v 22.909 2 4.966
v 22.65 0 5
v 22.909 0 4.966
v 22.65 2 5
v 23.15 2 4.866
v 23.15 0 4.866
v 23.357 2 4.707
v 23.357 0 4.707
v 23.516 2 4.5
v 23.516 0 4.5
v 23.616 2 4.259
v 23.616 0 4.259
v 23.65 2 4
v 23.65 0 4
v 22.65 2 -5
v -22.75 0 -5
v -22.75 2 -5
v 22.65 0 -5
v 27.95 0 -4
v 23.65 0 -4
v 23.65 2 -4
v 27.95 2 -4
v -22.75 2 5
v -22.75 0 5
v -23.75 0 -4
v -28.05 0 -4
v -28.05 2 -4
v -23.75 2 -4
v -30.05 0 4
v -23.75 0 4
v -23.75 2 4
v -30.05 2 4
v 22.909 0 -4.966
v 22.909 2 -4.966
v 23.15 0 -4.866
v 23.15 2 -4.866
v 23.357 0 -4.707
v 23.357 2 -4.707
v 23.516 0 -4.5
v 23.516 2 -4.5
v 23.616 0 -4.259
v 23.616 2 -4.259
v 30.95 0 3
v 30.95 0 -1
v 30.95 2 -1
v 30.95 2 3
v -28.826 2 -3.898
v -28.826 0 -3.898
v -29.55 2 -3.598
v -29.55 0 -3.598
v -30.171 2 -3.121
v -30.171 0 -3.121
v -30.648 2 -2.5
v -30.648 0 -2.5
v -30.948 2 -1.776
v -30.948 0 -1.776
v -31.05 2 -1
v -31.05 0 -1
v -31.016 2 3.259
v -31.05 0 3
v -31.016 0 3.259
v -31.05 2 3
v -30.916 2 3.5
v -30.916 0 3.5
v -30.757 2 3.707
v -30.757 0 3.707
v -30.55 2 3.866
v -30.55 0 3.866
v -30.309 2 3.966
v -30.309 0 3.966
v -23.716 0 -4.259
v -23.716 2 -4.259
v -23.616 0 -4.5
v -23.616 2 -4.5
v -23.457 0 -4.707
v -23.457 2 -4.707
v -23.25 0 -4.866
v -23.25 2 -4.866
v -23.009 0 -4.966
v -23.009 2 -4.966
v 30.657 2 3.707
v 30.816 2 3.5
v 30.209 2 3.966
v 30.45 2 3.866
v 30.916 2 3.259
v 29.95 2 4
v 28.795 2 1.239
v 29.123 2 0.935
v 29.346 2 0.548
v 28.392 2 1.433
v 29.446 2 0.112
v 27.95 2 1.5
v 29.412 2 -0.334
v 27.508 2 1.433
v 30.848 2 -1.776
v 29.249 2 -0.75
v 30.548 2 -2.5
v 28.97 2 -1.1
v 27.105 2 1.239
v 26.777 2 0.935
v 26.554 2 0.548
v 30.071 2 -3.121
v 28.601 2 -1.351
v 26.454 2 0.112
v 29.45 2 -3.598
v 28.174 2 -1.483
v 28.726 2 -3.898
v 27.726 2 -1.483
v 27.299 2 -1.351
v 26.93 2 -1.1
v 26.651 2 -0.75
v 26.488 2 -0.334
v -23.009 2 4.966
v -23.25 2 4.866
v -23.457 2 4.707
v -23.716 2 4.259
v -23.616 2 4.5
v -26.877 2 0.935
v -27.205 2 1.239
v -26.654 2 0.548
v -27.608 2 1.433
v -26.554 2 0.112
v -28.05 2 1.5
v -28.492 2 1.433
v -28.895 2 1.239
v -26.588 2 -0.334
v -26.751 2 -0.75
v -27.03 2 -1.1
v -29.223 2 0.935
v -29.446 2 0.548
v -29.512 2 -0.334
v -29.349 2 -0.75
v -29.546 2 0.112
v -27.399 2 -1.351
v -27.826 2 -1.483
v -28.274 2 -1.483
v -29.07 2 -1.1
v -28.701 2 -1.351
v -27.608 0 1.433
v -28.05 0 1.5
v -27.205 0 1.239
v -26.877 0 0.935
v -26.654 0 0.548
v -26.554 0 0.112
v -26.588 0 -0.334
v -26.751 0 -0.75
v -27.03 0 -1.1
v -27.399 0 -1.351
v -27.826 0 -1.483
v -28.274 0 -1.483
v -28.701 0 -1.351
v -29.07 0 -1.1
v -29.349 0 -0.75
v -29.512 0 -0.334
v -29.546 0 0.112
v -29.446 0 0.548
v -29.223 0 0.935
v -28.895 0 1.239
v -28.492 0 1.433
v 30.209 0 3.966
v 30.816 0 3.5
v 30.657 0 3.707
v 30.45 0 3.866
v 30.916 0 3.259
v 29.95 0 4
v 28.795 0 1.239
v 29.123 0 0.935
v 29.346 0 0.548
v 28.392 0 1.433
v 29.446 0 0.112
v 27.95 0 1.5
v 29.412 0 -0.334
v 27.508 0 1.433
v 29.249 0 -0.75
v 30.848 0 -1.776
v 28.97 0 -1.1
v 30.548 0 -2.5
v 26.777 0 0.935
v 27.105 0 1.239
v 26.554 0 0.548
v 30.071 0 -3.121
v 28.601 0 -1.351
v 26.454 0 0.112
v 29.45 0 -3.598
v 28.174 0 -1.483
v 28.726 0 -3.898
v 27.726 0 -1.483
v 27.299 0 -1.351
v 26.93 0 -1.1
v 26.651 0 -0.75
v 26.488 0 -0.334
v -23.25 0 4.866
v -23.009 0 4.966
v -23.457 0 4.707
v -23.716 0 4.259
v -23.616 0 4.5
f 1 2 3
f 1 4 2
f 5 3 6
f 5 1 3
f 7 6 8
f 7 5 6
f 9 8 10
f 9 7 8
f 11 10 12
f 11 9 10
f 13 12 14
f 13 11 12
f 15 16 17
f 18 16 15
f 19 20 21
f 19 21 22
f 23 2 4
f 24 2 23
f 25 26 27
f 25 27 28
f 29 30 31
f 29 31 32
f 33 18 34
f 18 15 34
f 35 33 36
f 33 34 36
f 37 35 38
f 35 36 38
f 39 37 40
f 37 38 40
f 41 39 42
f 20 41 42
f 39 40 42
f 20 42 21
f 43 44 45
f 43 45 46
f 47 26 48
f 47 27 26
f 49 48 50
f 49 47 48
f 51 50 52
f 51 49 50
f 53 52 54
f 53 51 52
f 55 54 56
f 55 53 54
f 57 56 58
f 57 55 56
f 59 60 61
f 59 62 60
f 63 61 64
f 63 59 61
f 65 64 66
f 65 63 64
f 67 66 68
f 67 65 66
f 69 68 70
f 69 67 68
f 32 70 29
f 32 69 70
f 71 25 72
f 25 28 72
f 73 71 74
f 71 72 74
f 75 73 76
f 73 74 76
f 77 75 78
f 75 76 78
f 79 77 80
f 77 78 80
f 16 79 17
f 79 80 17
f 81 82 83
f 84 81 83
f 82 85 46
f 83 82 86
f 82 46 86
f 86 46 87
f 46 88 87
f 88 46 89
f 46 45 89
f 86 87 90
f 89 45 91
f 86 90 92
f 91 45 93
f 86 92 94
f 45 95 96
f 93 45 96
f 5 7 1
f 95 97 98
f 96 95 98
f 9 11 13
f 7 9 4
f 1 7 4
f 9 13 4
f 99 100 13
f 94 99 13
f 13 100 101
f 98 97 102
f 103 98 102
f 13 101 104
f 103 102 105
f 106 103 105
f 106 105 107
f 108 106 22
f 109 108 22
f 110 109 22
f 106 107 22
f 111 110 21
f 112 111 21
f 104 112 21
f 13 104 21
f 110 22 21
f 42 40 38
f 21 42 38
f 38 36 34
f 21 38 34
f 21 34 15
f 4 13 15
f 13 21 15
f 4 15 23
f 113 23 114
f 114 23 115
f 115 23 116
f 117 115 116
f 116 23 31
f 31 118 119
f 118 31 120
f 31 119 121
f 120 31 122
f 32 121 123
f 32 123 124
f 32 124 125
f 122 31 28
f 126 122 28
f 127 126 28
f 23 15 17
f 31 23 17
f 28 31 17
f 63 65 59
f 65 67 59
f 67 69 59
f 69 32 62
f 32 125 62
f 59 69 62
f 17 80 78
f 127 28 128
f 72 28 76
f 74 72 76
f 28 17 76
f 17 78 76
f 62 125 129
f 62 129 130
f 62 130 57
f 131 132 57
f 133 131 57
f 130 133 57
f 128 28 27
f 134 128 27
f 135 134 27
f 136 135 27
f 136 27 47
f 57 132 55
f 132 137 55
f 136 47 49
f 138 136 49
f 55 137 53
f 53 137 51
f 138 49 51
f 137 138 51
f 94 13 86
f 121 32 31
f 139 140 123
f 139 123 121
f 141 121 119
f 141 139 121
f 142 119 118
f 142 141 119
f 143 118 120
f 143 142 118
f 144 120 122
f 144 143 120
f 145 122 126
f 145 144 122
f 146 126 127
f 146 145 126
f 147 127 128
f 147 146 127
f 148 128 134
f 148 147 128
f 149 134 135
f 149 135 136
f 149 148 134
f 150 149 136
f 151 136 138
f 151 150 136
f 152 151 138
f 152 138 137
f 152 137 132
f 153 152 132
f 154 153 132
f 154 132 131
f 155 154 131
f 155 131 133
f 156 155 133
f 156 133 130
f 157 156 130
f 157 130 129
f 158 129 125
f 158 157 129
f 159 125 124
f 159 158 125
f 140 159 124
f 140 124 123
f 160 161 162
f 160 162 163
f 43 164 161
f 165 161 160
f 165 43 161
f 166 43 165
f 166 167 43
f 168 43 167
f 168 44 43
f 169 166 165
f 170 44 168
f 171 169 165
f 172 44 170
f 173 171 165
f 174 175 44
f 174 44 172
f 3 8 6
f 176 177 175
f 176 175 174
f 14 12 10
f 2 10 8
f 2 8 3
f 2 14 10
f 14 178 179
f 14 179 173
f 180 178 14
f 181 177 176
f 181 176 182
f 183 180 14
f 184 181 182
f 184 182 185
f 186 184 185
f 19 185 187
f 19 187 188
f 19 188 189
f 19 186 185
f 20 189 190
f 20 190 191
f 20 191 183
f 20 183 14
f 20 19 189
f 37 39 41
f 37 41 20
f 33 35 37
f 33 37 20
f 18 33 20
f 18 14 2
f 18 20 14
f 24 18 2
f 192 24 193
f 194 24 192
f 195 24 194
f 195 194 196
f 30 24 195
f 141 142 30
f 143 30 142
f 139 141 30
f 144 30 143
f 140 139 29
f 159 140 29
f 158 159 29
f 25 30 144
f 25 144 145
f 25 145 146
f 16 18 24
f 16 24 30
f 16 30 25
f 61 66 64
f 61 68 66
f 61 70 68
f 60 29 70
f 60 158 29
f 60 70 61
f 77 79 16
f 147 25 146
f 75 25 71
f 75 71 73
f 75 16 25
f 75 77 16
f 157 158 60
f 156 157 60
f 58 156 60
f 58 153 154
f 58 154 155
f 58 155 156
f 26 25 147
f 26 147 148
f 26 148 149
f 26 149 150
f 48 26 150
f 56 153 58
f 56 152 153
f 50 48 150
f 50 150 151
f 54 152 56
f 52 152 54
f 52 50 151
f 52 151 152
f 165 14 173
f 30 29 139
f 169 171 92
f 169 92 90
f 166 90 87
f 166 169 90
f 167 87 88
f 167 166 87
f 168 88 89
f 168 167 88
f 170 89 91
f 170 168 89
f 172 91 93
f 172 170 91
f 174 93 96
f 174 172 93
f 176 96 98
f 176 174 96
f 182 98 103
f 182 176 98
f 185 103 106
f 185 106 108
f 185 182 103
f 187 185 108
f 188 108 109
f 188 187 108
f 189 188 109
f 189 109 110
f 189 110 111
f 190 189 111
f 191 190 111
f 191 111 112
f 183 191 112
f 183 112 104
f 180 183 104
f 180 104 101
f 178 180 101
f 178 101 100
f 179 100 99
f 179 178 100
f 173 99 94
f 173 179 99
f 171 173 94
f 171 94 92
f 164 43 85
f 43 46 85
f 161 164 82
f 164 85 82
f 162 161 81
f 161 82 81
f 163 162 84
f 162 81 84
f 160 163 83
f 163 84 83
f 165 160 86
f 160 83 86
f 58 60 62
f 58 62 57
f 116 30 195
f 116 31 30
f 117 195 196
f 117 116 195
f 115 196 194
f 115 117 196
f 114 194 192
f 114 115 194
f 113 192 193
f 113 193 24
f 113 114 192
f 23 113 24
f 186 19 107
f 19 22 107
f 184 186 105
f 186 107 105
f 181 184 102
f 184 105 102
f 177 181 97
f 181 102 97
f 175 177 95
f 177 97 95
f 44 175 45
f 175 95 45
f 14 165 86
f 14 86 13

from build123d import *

# Parameters (mm, degrees)
SKETCH1_R           = 1.5
BOSS_EXTRUDE1_DEPTH = 2
FILLET1_R           = 3
FILLET2_R           = 1


with BuildPart() as part:
    # Sketch1 → Boss-Extrude1 (new body)
    with BuildSketch(Plane(origin=(0, 0, 0), x_dir=(1, 0, 0), z_dir=(0, 1, 0))):
        Polygon((-23.75, 5), (23.65, 5), (23.65, 4), (30.95, 4), (30.95, -4), (23.65, -4), (23.65, -5), (-23.75, -5), (-23.75, -4), (-31.05, -4), (-31.05, 4), (-23.75, 4), align=None)
        with Locations(Location((-28.05, 0, 0), (0, 0, 270))):
            Circle(SKETCH1_R, mode=Mode.SUBTRACT)
        with Locations(Location((27.95, 0, 0), (0, 0, 270))):
            Circle(SKETCH1_R, mode=Mode.SUBTRACT)
    extrude(amount=BOSS_EXTRUDE1_DEPTH)

    # Fillet1
    fillet1_edges = [part.edges().sort_by_distance(p)[0] for p in [
        (-31.05, 1, -4),
        (30.95, 1, -4),
    ]]
    fillet(fillet1_edges, radius=FILLET1_R)

    # Fillet2
    fillet2_edges = [part.edges().sort_by_distance(p)[0] for p in [
        (-23.75, 1, 5),
        (23.65, 1, 5),
        (23.65, 1, -5),
        (-23.75, 1, -5),
        (-31.05, 1, 4),
        (30.95, 1, 4),
    ]]
    fillet(fillet2_edges, radius=FILLET2_R - 0.0001)  # a hair under: the kernel refuses the full size


solid = part.part
